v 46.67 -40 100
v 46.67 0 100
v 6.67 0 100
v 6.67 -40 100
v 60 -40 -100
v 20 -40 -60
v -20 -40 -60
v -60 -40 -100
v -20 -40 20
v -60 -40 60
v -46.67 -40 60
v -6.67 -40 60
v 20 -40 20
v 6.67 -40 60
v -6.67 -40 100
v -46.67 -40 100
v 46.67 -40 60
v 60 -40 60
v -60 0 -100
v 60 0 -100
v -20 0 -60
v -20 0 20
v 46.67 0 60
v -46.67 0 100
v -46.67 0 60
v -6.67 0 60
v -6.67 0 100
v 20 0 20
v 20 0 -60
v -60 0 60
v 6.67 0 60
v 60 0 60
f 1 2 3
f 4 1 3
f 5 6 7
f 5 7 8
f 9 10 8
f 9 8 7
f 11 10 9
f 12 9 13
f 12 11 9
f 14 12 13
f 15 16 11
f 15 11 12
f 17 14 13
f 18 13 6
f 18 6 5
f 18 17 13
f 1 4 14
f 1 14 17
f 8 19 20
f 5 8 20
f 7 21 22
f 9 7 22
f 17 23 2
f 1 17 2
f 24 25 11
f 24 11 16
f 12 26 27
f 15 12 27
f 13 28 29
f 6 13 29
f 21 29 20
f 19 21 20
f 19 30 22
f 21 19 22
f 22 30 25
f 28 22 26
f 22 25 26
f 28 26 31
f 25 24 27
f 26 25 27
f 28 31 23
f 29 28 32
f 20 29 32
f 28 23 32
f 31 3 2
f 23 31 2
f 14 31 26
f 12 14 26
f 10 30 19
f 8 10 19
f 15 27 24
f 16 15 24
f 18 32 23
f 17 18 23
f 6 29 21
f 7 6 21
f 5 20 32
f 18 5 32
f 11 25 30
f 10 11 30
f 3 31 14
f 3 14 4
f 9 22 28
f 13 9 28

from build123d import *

# Parameters (mm, degrees)
F0_W     = 26.67
F0_H     = 40
F0_W_2   = 13.33
F0_W_3   = 40
F1_DEPTH = 40


with BuildPart() as f1:
    # F0 (on Front) → F1 (new body)
    with BuildSketch(Plane.XZ):
        with Locations((-33.335, 80)):
            Rectangle(F0_W, F0_H)
        with Locations((-13.335, 80)):
            Rectangle(F0_W_2, F0_H)
        with Locations((13.335, 80)):
            Rectangle(F0_W_2, F0_H)
        with Locations((33.335, 80)):
            Rectangle(F0_W, F0_H)
        Polygon((-60, 20), (-20, 20), (-20, 60), (-46.67, 60), (-60, 60), align=None)
        Polygon((20, 20), (20, 60), (6.67, 60), (-6.67, 60), (-20, 60), (-20, 20), align=None)
        Polygon((60, 20), (60, 60), (46.67, 60), (20, 60), (20, 20), align=None)
        with Locations((40, 0)):
            Rectangle(F0_W_3, F0_H)
        with Locations((40, -40)):
            Rectangle(F0_W_3, F0_H)
        with Locations((40, -80)):
            Rectangle(F0_W_3, F0_H)
        with Locations((0, -80)):
            Rectangle(F0_W_3, F0_H)
        with Locations((-40, -80)):
            Rectangle(F0_W_3, F0_H)
        with Locations((-40, -40)):
            Rectangle(F0_W_3, F0_H)
        with Locations((-40, 0)):
            Rectangle(F0_W_3, F0_H)
    extrude(amount=F1_DEPTH)


solid = f1.part
